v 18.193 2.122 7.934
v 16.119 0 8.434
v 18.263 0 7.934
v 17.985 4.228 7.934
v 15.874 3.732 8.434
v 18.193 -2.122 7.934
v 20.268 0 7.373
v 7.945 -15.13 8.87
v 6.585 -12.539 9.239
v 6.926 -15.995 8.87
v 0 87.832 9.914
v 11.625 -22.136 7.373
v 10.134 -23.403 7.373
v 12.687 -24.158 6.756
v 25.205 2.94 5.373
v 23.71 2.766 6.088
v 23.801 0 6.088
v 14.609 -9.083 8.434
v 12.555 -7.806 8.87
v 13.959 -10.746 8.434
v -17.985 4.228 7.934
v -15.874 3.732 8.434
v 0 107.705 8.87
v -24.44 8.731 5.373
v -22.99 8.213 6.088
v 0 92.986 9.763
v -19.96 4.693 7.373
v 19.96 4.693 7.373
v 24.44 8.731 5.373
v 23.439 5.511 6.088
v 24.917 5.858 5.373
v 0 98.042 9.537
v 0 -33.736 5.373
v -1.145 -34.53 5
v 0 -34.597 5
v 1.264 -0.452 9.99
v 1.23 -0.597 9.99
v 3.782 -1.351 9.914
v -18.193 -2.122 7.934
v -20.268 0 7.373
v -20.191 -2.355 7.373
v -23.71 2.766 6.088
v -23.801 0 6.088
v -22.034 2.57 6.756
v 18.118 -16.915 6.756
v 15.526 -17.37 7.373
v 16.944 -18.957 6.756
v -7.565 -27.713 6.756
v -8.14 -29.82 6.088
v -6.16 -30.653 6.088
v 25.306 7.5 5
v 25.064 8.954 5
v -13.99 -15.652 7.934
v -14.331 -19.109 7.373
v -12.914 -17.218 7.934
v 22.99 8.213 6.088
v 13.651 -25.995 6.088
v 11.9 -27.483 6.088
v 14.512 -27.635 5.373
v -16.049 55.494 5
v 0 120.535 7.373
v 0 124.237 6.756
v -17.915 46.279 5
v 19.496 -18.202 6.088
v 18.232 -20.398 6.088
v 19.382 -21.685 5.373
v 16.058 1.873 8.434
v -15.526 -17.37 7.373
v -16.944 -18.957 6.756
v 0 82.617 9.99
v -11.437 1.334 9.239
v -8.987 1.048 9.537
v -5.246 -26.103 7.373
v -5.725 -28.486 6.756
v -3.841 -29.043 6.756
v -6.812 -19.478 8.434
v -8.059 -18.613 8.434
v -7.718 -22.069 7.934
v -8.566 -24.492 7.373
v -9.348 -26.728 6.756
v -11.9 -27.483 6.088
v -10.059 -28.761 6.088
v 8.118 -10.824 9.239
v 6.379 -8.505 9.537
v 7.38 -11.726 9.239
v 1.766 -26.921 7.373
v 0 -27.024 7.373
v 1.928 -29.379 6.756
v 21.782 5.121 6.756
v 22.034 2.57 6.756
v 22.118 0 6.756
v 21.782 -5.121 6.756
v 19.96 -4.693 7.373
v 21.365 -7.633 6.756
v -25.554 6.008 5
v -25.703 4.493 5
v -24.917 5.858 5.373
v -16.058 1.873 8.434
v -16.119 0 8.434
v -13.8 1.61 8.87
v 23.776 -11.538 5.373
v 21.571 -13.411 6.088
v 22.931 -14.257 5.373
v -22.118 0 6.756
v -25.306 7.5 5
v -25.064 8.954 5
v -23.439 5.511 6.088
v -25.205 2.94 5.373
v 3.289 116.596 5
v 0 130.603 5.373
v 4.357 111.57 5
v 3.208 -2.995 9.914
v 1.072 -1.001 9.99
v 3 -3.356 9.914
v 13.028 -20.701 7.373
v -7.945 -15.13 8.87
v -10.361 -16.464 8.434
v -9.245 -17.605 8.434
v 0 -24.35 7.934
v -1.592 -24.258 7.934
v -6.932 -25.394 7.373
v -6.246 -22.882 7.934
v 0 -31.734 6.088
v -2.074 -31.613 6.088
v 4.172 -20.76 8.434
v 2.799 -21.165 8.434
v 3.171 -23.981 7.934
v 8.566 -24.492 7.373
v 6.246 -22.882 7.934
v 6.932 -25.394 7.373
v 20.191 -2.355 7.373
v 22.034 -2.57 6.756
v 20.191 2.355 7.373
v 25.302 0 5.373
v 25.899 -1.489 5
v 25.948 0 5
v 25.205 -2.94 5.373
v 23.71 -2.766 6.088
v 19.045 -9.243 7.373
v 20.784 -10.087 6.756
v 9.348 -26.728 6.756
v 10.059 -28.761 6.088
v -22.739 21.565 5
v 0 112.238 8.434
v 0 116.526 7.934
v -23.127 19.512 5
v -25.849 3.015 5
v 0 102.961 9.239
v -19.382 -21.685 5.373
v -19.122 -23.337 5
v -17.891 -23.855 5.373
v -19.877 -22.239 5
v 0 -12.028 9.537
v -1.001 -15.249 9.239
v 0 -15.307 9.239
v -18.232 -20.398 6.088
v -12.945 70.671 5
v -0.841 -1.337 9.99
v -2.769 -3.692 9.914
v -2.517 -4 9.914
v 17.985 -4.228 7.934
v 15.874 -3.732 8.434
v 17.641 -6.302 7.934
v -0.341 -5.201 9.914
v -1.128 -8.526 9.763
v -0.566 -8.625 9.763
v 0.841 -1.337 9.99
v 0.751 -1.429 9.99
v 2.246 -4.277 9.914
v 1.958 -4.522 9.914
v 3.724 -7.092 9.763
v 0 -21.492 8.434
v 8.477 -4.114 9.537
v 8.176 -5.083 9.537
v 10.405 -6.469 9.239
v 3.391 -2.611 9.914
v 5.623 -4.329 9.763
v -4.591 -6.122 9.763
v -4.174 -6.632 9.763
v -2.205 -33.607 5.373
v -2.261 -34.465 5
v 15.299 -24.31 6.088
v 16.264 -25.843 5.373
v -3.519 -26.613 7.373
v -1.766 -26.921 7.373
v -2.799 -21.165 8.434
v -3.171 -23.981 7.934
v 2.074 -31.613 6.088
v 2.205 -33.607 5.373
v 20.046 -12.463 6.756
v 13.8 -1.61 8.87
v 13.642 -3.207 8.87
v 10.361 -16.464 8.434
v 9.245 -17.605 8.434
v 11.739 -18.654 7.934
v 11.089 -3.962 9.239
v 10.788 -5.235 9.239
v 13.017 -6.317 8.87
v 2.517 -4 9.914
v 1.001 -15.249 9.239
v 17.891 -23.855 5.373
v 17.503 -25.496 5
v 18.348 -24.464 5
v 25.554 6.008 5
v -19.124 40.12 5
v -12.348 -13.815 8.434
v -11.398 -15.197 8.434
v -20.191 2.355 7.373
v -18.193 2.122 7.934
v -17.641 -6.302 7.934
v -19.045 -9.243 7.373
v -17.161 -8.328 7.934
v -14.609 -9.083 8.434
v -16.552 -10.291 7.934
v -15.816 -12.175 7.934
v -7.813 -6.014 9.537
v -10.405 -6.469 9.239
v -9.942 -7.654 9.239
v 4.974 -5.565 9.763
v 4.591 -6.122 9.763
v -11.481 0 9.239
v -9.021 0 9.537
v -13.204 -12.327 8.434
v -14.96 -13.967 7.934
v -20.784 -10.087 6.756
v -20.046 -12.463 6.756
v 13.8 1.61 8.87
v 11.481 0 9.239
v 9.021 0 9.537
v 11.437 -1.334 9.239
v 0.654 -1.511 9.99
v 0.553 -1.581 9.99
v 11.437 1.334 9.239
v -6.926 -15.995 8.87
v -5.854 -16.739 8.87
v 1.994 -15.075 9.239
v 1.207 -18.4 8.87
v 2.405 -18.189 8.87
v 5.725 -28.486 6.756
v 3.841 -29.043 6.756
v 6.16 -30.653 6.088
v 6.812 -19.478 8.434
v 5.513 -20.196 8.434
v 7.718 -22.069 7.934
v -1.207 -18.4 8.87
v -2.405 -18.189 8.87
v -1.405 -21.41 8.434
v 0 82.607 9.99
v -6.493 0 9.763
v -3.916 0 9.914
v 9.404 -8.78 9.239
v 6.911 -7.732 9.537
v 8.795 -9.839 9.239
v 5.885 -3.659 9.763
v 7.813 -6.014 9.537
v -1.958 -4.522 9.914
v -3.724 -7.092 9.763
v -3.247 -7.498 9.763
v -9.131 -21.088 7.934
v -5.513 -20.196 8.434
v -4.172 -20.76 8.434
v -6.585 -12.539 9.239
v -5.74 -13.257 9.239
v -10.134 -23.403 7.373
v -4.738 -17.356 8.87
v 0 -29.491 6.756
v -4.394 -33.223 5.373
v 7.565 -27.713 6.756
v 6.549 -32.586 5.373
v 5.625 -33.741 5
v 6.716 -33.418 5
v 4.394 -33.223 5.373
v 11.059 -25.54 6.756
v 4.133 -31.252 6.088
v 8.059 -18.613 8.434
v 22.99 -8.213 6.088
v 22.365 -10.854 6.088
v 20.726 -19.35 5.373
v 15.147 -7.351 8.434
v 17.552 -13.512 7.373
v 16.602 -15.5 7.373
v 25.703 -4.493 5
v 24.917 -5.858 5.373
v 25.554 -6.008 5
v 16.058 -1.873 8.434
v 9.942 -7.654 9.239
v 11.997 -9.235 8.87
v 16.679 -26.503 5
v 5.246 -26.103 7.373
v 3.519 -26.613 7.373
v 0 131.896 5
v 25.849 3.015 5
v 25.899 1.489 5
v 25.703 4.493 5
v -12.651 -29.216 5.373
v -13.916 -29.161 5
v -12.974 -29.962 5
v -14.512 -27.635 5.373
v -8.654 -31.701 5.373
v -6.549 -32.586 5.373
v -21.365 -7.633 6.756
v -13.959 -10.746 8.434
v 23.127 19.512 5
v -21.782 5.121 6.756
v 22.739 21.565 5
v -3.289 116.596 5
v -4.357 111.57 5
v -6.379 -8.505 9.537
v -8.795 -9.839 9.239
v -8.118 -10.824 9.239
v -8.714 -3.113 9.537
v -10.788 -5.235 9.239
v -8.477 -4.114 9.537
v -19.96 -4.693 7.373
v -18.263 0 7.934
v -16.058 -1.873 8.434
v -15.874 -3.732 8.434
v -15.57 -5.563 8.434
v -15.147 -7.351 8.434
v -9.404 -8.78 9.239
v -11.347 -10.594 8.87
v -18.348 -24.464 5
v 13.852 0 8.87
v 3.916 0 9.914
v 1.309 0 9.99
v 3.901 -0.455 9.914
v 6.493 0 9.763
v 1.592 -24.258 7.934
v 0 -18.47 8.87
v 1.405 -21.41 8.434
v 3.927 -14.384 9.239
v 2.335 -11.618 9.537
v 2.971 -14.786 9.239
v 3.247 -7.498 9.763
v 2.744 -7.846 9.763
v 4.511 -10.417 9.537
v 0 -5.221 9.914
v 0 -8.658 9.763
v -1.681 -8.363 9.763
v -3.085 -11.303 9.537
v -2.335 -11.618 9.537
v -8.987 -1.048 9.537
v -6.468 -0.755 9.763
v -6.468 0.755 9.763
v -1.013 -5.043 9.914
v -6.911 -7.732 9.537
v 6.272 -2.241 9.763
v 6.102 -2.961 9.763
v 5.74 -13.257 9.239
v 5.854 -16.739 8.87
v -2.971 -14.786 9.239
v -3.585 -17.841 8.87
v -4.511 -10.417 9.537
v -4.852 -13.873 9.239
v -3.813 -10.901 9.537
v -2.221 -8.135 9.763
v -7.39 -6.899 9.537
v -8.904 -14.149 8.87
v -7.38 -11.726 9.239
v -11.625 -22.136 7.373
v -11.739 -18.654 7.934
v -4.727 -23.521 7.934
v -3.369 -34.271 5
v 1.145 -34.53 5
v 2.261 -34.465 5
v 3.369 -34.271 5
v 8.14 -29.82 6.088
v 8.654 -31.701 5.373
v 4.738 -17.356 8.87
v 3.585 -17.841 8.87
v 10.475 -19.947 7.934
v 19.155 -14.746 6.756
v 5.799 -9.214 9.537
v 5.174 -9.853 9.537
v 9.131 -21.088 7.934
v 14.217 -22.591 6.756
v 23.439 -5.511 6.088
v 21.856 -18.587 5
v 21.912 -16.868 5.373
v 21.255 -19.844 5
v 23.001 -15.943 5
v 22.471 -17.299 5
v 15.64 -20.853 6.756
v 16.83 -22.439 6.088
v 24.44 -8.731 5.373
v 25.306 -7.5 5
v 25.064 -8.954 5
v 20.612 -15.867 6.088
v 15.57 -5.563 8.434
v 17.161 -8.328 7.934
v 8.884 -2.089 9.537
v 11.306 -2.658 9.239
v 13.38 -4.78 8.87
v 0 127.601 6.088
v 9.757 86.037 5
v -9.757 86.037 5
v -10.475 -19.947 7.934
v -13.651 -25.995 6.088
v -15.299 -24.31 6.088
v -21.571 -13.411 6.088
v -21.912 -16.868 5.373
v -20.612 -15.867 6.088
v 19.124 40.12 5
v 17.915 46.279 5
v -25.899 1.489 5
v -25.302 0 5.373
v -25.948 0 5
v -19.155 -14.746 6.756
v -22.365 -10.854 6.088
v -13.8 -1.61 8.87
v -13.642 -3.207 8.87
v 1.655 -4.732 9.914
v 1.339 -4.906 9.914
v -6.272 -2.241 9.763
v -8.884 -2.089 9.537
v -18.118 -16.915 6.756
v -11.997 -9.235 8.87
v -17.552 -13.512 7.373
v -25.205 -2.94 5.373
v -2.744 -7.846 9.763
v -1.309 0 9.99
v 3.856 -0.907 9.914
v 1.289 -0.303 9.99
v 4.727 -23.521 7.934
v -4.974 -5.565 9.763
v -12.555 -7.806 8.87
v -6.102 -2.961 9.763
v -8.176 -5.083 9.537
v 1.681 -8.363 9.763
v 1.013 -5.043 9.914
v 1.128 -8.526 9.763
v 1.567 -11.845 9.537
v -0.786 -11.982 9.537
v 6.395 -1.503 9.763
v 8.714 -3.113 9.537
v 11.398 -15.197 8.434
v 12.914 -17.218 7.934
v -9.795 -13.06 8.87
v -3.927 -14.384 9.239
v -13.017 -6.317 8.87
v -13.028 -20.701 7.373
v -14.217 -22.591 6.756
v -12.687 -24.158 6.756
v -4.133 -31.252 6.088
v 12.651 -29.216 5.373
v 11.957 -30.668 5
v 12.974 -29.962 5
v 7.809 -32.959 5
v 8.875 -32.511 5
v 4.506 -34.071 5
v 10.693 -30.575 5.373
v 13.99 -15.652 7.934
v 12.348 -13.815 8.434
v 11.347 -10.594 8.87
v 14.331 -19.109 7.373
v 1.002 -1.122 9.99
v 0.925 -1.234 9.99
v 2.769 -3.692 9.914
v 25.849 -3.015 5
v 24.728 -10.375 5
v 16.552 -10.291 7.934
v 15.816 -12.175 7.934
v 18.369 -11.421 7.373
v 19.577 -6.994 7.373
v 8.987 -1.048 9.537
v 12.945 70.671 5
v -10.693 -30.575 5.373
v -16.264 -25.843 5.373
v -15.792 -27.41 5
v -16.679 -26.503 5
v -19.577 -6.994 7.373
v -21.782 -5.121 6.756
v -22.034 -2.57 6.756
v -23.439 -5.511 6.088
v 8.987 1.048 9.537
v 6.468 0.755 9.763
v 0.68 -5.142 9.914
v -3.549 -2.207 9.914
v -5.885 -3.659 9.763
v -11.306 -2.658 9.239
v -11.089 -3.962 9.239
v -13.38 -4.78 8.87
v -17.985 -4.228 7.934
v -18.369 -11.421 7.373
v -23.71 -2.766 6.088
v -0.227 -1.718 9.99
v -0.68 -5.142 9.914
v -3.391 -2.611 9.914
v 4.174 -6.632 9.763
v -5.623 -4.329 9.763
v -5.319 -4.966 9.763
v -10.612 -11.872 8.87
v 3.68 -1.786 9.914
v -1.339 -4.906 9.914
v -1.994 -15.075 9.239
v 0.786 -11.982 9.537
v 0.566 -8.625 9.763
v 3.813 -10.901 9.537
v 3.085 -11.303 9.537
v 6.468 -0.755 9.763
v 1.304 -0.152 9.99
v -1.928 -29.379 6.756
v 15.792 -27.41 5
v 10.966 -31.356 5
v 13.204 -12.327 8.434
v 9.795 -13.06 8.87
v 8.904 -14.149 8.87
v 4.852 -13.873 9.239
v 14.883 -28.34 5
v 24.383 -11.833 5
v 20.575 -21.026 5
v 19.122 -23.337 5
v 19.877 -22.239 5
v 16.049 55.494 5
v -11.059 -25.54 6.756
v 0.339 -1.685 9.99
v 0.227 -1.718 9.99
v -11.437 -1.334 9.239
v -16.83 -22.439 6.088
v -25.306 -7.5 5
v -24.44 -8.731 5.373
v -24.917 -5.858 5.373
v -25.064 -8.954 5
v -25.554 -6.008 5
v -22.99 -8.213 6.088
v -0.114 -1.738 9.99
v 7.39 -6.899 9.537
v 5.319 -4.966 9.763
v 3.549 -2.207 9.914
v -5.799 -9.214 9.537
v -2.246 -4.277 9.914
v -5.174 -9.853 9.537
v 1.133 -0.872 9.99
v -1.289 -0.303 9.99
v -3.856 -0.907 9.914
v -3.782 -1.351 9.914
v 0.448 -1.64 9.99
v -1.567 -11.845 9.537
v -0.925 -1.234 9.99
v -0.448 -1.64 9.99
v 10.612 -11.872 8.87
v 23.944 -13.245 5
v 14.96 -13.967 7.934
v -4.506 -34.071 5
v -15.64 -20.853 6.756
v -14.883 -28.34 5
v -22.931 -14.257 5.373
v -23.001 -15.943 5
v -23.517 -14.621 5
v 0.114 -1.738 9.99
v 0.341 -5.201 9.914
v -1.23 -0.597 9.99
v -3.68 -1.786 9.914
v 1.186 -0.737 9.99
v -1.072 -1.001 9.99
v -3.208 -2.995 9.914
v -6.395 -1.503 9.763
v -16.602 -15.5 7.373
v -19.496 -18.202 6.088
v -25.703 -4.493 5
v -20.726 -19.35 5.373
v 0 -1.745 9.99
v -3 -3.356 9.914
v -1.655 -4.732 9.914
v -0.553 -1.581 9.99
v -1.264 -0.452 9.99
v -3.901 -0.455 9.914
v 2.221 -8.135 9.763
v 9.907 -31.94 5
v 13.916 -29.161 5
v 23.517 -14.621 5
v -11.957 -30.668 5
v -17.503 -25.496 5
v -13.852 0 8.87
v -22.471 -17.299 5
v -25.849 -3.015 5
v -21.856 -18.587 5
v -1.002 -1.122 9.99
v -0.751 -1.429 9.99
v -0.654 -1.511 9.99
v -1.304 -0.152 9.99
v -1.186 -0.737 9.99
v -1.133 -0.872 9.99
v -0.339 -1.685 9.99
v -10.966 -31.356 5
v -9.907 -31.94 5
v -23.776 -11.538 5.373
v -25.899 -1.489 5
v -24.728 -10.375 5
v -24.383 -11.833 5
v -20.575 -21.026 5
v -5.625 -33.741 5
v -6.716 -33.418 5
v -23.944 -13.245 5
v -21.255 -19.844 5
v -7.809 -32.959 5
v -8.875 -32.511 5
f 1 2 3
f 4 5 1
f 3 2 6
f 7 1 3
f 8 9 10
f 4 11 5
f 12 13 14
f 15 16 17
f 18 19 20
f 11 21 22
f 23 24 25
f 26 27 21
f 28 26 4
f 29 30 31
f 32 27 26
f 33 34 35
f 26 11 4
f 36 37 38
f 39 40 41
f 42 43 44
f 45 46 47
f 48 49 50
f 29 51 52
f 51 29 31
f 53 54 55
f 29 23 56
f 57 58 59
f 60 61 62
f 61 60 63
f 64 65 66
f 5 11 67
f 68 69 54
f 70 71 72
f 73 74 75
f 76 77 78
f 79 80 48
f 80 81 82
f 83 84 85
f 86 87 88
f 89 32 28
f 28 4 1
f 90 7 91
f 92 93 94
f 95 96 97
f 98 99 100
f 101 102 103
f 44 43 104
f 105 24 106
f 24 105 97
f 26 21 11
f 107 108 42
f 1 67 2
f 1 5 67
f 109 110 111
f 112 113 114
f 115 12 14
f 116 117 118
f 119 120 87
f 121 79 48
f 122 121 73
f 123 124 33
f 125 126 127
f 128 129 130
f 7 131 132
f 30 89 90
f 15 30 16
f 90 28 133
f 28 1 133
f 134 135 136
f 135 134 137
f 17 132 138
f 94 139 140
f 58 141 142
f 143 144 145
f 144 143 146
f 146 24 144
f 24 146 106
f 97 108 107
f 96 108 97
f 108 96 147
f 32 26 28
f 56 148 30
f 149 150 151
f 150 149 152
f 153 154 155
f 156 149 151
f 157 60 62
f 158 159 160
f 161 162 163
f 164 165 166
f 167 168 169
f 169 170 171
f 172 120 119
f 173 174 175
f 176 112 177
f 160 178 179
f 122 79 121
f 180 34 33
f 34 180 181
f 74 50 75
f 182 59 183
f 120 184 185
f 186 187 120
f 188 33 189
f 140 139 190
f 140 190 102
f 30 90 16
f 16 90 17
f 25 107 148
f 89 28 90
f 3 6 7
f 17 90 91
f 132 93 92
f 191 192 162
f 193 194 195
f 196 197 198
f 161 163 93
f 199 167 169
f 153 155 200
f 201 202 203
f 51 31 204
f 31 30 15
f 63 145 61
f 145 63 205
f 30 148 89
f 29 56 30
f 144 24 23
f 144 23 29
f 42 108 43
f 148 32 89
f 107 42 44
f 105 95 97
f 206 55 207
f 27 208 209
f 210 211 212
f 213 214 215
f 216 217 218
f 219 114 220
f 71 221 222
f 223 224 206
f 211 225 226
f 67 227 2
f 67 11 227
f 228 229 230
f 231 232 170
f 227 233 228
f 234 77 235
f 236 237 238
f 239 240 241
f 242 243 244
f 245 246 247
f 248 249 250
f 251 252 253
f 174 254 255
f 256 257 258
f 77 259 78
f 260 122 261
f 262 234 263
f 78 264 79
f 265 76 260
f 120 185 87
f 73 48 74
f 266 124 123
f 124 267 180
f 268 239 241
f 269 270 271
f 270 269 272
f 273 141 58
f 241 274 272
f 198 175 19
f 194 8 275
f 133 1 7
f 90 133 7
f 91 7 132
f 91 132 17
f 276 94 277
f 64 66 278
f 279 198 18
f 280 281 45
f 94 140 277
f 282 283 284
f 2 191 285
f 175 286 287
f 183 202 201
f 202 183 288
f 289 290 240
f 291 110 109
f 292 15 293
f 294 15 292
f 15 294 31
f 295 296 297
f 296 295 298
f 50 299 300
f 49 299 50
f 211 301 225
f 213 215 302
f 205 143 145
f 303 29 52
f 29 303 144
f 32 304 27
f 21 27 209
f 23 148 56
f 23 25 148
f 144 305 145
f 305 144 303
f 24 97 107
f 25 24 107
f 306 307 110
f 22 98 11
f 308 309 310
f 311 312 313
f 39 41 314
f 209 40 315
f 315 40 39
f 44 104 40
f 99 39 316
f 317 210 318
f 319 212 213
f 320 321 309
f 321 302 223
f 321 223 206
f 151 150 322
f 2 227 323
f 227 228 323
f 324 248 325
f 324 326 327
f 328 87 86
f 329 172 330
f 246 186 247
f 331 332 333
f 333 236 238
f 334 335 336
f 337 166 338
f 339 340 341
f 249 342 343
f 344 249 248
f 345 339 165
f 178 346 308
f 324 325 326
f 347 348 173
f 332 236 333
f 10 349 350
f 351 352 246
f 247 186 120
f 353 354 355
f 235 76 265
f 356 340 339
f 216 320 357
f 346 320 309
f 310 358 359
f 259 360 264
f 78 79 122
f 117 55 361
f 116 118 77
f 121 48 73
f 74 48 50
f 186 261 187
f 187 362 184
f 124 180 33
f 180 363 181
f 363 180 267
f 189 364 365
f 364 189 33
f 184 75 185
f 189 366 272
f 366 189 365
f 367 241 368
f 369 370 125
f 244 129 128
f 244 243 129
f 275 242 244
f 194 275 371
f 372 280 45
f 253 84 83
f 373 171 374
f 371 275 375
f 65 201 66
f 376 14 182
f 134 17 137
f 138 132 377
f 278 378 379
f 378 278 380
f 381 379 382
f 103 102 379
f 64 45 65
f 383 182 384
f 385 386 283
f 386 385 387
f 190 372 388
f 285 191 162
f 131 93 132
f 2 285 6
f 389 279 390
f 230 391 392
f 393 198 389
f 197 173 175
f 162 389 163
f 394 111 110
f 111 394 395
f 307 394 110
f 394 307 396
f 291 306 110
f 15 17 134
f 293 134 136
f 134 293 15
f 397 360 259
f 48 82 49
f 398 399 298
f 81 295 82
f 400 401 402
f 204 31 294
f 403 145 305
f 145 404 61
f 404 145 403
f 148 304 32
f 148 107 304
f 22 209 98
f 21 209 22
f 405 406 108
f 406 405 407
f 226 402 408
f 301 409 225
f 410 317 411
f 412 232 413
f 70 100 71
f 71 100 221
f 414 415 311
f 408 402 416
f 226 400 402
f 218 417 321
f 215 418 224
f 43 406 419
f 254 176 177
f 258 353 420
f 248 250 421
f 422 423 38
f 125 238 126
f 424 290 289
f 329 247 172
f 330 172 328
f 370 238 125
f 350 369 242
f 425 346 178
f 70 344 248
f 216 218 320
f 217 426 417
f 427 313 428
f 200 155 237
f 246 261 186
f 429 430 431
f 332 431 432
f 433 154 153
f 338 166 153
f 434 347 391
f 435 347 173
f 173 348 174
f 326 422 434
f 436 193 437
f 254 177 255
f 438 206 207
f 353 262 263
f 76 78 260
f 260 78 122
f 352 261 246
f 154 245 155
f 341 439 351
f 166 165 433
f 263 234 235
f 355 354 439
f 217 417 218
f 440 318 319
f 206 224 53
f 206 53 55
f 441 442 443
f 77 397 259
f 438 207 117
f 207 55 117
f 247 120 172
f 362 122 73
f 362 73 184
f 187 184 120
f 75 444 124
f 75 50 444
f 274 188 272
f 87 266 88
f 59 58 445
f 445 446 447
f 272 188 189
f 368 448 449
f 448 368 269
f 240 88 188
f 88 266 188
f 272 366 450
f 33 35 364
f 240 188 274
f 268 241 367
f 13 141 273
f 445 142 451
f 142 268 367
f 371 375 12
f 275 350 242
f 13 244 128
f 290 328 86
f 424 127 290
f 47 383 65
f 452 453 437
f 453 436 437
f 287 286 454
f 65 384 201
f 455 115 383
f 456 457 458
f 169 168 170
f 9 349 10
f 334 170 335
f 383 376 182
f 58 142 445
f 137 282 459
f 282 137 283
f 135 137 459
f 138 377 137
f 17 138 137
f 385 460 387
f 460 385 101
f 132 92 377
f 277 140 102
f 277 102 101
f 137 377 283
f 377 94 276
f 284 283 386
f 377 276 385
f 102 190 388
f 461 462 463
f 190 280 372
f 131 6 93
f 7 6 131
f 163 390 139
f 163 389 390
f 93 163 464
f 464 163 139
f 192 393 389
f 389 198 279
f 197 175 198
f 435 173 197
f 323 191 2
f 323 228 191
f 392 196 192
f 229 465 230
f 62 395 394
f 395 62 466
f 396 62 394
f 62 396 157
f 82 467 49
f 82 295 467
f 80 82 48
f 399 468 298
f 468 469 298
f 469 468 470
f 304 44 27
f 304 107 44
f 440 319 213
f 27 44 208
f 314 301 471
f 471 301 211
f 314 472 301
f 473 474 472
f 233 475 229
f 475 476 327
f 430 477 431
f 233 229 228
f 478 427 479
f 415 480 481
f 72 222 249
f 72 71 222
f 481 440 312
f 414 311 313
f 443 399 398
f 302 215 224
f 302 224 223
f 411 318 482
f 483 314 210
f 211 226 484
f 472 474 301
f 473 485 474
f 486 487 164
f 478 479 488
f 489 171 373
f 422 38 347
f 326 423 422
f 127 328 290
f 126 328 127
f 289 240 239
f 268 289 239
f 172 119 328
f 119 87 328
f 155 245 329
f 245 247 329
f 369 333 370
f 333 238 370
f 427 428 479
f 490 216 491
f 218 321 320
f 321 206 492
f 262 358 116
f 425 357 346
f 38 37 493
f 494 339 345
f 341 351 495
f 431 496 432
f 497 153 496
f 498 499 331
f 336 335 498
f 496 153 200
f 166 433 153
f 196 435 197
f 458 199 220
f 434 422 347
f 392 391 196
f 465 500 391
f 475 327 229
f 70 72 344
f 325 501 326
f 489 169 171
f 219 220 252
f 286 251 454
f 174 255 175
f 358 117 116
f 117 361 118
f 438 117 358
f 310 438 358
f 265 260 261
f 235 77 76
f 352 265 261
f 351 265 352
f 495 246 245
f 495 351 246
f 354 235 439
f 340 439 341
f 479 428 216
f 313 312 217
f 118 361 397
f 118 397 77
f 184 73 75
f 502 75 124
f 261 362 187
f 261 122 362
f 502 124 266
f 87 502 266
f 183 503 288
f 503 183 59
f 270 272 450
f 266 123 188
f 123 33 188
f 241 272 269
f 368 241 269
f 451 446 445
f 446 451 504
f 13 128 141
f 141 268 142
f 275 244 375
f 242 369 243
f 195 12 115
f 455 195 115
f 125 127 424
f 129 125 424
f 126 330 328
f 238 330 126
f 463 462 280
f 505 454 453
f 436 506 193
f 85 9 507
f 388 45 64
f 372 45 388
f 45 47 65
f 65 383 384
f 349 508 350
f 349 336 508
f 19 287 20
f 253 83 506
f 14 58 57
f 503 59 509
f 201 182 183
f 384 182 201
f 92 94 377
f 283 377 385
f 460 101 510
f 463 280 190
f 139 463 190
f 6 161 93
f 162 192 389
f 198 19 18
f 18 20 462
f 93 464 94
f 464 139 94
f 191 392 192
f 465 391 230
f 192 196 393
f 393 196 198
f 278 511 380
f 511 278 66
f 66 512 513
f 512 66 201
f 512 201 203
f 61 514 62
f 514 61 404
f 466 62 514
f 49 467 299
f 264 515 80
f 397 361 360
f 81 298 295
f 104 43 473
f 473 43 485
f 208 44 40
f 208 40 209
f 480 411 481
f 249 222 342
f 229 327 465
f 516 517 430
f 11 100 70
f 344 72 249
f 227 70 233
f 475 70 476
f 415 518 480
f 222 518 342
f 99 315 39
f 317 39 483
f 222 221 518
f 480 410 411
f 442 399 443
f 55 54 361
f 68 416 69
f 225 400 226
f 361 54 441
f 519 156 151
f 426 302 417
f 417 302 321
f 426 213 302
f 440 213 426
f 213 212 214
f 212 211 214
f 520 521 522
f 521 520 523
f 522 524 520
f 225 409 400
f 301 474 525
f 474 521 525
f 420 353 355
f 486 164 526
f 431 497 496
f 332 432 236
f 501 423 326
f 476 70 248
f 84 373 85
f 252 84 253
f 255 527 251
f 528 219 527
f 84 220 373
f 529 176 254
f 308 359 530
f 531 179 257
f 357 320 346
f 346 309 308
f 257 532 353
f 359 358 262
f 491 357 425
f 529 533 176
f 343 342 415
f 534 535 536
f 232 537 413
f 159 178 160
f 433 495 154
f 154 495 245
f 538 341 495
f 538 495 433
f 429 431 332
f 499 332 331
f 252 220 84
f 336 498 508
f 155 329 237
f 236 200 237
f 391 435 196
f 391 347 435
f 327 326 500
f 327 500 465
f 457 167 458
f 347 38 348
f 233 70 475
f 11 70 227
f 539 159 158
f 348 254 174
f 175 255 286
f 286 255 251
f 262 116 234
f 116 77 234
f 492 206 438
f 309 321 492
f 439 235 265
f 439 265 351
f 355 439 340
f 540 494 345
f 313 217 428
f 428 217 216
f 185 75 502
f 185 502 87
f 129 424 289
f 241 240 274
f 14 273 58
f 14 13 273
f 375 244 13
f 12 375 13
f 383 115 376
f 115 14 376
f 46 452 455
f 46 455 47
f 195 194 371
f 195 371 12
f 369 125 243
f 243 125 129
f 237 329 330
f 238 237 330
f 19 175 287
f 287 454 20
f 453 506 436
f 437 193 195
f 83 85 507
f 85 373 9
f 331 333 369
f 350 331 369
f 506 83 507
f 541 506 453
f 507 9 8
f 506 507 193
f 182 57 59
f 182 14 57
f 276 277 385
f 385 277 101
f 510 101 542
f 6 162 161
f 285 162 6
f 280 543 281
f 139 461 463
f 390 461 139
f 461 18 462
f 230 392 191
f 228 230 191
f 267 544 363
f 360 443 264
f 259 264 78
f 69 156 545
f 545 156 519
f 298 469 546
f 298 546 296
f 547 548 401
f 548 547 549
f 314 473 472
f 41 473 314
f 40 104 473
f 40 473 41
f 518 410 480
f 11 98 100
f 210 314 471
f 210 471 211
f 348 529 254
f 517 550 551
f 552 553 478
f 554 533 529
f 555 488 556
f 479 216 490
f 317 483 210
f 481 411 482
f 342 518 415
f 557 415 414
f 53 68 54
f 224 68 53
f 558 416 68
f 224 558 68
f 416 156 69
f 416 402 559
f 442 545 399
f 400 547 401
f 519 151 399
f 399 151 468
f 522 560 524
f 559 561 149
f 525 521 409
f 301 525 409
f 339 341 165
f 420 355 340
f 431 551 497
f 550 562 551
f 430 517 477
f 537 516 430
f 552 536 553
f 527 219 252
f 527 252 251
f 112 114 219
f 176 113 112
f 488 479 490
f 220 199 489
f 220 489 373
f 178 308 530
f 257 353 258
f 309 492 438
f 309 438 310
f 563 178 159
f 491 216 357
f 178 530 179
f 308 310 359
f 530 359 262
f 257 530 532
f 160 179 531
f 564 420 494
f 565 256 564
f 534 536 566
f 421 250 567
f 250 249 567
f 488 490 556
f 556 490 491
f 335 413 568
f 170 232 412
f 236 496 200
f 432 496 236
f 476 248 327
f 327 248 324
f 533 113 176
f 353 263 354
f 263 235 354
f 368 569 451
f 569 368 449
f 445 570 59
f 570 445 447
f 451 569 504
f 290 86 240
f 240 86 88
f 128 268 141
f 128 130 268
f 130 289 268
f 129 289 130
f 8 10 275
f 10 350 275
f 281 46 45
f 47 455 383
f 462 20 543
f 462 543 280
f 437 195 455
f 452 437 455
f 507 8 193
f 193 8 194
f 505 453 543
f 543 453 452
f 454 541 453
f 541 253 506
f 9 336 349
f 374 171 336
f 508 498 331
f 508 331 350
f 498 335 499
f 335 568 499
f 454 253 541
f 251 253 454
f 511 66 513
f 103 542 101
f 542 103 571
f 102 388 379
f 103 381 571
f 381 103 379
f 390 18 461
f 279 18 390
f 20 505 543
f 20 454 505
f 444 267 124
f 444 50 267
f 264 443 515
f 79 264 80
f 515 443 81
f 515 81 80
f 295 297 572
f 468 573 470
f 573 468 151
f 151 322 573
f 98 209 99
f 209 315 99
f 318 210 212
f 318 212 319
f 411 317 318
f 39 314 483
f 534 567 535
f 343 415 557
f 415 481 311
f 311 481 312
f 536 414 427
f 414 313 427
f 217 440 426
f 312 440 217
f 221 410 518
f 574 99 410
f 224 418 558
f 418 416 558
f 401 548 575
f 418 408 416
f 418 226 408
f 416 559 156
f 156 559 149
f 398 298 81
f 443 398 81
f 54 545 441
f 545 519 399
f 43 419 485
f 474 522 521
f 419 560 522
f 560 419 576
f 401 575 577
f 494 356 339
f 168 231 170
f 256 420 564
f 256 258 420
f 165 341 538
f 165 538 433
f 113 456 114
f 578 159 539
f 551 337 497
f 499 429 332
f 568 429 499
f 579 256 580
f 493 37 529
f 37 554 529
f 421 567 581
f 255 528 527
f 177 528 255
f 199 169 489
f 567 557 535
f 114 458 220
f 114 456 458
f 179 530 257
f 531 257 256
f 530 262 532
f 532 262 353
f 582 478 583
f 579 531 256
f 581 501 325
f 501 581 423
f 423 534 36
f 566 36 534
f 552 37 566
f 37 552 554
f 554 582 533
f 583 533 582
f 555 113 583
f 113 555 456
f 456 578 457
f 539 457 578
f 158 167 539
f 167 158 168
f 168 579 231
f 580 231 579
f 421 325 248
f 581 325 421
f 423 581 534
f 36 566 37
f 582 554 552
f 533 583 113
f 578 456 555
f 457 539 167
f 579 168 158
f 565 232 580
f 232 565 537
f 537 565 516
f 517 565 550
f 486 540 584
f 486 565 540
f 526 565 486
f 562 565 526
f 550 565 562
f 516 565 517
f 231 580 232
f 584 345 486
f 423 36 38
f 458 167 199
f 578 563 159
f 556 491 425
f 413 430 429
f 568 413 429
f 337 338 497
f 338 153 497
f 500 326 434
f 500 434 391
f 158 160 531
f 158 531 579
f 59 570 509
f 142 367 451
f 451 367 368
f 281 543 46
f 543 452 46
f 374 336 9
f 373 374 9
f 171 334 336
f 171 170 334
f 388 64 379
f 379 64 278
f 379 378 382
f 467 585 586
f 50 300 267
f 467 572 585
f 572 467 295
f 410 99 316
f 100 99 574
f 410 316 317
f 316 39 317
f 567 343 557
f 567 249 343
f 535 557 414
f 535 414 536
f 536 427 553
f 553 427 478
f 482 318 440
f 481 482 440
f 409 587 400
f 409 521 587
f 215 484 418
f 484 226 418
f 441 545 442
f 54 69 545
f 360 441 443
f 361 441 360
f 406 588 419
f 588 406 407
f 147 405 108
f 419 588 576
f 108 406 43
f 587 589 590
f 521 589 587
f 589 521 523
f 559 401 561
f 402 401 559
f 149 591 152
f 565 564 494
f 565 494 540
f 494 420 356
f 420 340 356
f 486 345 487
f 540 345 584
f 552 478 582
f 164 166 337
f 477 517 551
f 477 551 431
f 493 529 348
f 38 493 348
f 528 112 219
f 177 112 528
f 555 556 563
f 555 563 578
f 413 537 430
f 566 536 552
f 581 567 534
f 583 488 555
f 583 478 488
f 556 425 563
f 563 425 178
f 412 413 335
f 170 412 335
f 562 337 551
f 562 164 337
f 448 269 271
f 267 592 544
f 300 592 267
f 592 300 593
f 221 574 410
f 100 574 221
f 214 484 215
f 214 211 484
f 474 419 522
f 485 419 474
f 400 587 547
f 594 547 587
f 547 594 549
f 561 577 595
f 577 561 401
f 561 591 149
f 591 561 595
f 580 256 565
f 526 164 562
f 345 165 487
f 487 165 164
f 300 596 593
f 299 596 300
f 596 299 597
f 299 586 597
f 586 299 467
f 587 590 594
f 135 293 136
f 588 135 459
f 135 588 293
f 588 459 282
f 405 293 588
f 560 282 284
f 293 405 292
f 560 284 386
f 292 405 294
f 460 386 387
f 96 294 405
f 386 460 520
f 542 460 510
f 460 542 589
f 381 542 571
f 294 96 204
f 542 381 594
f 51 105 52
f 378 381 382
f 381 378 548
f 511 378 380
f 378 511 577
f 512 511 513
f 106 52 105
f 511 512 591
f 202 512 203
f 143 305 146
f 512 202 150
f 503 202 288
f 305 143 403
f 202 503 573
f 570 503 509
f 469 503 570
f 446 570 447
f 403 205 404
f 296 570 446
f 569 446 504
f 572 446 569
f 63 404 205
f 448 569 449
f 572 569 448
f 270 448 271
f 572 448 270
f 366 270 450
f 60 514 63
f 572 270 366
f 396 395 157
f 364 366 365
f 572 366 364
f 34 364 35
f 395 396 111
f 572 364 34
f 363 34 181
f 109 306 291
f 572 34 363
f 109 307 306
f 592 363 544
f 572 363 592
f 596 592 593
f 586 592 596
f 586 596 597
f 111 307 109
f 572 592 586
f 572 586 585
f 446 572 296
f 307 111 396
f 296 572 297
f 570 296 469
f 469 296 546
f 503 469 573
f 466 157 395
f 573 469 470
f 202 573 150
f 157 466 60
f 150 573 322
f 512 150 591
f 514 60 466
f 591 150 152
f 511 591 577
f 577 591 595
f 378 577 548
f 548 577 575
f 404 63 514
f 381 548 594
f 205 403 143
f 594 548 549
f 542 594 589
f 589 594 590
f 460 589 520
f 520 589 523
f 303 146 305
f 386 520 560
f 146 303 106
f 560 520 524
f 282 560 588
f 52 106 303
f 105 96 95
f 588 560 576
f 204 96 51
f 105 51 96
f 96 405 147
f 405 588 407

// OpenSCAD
// SPDX-License-Identifier: CC-BY-SA-4.0
//
//plate to cover holes which have to be cut to allow water jackets to fit
//
//Copyright (C) 2018 Peter Bennett <thelargeostrich@gmail.com>
//
//This design is licensed under a Creative Commons Attribution-ShareAlike
//4.0 International license.
//
//You are free to:
//  Share — copy and redistribute the material in any medium or format
//  Adapt — remix, transform, and build upon the material
//          for any purpose, even commercially.
//
//Under the following terms:
//
//  Attribution — You must give appropriate credit, provide a link to
//                the license, and indicate if changes were made. You
//                may do so in any reasonable manner, but not in any
//                way that suggests the licensor endorses you or your use.
//  ShareAlike  — If you remix, transform, or build upon the material,
//                you must distribute your contributions under the same
//                license as the original.
//  No additional restrictions — You may not apply legal terms or
//                technological measures that legally restrict others
//                from doing anything the license permits.

$fn=72;
module cover(){
    difference(){
        hull(){
            translate([0,0,0])
                scale([3,4,1])
                    sphere(r=10,center=true);
            translate([0,80,0])
                scale([0.01,6,1])
                    sphere(r=10,center=true);
        };
        translate([0,0,-20])
            cube([600,600,50],center=true);
    };
}
cover();
